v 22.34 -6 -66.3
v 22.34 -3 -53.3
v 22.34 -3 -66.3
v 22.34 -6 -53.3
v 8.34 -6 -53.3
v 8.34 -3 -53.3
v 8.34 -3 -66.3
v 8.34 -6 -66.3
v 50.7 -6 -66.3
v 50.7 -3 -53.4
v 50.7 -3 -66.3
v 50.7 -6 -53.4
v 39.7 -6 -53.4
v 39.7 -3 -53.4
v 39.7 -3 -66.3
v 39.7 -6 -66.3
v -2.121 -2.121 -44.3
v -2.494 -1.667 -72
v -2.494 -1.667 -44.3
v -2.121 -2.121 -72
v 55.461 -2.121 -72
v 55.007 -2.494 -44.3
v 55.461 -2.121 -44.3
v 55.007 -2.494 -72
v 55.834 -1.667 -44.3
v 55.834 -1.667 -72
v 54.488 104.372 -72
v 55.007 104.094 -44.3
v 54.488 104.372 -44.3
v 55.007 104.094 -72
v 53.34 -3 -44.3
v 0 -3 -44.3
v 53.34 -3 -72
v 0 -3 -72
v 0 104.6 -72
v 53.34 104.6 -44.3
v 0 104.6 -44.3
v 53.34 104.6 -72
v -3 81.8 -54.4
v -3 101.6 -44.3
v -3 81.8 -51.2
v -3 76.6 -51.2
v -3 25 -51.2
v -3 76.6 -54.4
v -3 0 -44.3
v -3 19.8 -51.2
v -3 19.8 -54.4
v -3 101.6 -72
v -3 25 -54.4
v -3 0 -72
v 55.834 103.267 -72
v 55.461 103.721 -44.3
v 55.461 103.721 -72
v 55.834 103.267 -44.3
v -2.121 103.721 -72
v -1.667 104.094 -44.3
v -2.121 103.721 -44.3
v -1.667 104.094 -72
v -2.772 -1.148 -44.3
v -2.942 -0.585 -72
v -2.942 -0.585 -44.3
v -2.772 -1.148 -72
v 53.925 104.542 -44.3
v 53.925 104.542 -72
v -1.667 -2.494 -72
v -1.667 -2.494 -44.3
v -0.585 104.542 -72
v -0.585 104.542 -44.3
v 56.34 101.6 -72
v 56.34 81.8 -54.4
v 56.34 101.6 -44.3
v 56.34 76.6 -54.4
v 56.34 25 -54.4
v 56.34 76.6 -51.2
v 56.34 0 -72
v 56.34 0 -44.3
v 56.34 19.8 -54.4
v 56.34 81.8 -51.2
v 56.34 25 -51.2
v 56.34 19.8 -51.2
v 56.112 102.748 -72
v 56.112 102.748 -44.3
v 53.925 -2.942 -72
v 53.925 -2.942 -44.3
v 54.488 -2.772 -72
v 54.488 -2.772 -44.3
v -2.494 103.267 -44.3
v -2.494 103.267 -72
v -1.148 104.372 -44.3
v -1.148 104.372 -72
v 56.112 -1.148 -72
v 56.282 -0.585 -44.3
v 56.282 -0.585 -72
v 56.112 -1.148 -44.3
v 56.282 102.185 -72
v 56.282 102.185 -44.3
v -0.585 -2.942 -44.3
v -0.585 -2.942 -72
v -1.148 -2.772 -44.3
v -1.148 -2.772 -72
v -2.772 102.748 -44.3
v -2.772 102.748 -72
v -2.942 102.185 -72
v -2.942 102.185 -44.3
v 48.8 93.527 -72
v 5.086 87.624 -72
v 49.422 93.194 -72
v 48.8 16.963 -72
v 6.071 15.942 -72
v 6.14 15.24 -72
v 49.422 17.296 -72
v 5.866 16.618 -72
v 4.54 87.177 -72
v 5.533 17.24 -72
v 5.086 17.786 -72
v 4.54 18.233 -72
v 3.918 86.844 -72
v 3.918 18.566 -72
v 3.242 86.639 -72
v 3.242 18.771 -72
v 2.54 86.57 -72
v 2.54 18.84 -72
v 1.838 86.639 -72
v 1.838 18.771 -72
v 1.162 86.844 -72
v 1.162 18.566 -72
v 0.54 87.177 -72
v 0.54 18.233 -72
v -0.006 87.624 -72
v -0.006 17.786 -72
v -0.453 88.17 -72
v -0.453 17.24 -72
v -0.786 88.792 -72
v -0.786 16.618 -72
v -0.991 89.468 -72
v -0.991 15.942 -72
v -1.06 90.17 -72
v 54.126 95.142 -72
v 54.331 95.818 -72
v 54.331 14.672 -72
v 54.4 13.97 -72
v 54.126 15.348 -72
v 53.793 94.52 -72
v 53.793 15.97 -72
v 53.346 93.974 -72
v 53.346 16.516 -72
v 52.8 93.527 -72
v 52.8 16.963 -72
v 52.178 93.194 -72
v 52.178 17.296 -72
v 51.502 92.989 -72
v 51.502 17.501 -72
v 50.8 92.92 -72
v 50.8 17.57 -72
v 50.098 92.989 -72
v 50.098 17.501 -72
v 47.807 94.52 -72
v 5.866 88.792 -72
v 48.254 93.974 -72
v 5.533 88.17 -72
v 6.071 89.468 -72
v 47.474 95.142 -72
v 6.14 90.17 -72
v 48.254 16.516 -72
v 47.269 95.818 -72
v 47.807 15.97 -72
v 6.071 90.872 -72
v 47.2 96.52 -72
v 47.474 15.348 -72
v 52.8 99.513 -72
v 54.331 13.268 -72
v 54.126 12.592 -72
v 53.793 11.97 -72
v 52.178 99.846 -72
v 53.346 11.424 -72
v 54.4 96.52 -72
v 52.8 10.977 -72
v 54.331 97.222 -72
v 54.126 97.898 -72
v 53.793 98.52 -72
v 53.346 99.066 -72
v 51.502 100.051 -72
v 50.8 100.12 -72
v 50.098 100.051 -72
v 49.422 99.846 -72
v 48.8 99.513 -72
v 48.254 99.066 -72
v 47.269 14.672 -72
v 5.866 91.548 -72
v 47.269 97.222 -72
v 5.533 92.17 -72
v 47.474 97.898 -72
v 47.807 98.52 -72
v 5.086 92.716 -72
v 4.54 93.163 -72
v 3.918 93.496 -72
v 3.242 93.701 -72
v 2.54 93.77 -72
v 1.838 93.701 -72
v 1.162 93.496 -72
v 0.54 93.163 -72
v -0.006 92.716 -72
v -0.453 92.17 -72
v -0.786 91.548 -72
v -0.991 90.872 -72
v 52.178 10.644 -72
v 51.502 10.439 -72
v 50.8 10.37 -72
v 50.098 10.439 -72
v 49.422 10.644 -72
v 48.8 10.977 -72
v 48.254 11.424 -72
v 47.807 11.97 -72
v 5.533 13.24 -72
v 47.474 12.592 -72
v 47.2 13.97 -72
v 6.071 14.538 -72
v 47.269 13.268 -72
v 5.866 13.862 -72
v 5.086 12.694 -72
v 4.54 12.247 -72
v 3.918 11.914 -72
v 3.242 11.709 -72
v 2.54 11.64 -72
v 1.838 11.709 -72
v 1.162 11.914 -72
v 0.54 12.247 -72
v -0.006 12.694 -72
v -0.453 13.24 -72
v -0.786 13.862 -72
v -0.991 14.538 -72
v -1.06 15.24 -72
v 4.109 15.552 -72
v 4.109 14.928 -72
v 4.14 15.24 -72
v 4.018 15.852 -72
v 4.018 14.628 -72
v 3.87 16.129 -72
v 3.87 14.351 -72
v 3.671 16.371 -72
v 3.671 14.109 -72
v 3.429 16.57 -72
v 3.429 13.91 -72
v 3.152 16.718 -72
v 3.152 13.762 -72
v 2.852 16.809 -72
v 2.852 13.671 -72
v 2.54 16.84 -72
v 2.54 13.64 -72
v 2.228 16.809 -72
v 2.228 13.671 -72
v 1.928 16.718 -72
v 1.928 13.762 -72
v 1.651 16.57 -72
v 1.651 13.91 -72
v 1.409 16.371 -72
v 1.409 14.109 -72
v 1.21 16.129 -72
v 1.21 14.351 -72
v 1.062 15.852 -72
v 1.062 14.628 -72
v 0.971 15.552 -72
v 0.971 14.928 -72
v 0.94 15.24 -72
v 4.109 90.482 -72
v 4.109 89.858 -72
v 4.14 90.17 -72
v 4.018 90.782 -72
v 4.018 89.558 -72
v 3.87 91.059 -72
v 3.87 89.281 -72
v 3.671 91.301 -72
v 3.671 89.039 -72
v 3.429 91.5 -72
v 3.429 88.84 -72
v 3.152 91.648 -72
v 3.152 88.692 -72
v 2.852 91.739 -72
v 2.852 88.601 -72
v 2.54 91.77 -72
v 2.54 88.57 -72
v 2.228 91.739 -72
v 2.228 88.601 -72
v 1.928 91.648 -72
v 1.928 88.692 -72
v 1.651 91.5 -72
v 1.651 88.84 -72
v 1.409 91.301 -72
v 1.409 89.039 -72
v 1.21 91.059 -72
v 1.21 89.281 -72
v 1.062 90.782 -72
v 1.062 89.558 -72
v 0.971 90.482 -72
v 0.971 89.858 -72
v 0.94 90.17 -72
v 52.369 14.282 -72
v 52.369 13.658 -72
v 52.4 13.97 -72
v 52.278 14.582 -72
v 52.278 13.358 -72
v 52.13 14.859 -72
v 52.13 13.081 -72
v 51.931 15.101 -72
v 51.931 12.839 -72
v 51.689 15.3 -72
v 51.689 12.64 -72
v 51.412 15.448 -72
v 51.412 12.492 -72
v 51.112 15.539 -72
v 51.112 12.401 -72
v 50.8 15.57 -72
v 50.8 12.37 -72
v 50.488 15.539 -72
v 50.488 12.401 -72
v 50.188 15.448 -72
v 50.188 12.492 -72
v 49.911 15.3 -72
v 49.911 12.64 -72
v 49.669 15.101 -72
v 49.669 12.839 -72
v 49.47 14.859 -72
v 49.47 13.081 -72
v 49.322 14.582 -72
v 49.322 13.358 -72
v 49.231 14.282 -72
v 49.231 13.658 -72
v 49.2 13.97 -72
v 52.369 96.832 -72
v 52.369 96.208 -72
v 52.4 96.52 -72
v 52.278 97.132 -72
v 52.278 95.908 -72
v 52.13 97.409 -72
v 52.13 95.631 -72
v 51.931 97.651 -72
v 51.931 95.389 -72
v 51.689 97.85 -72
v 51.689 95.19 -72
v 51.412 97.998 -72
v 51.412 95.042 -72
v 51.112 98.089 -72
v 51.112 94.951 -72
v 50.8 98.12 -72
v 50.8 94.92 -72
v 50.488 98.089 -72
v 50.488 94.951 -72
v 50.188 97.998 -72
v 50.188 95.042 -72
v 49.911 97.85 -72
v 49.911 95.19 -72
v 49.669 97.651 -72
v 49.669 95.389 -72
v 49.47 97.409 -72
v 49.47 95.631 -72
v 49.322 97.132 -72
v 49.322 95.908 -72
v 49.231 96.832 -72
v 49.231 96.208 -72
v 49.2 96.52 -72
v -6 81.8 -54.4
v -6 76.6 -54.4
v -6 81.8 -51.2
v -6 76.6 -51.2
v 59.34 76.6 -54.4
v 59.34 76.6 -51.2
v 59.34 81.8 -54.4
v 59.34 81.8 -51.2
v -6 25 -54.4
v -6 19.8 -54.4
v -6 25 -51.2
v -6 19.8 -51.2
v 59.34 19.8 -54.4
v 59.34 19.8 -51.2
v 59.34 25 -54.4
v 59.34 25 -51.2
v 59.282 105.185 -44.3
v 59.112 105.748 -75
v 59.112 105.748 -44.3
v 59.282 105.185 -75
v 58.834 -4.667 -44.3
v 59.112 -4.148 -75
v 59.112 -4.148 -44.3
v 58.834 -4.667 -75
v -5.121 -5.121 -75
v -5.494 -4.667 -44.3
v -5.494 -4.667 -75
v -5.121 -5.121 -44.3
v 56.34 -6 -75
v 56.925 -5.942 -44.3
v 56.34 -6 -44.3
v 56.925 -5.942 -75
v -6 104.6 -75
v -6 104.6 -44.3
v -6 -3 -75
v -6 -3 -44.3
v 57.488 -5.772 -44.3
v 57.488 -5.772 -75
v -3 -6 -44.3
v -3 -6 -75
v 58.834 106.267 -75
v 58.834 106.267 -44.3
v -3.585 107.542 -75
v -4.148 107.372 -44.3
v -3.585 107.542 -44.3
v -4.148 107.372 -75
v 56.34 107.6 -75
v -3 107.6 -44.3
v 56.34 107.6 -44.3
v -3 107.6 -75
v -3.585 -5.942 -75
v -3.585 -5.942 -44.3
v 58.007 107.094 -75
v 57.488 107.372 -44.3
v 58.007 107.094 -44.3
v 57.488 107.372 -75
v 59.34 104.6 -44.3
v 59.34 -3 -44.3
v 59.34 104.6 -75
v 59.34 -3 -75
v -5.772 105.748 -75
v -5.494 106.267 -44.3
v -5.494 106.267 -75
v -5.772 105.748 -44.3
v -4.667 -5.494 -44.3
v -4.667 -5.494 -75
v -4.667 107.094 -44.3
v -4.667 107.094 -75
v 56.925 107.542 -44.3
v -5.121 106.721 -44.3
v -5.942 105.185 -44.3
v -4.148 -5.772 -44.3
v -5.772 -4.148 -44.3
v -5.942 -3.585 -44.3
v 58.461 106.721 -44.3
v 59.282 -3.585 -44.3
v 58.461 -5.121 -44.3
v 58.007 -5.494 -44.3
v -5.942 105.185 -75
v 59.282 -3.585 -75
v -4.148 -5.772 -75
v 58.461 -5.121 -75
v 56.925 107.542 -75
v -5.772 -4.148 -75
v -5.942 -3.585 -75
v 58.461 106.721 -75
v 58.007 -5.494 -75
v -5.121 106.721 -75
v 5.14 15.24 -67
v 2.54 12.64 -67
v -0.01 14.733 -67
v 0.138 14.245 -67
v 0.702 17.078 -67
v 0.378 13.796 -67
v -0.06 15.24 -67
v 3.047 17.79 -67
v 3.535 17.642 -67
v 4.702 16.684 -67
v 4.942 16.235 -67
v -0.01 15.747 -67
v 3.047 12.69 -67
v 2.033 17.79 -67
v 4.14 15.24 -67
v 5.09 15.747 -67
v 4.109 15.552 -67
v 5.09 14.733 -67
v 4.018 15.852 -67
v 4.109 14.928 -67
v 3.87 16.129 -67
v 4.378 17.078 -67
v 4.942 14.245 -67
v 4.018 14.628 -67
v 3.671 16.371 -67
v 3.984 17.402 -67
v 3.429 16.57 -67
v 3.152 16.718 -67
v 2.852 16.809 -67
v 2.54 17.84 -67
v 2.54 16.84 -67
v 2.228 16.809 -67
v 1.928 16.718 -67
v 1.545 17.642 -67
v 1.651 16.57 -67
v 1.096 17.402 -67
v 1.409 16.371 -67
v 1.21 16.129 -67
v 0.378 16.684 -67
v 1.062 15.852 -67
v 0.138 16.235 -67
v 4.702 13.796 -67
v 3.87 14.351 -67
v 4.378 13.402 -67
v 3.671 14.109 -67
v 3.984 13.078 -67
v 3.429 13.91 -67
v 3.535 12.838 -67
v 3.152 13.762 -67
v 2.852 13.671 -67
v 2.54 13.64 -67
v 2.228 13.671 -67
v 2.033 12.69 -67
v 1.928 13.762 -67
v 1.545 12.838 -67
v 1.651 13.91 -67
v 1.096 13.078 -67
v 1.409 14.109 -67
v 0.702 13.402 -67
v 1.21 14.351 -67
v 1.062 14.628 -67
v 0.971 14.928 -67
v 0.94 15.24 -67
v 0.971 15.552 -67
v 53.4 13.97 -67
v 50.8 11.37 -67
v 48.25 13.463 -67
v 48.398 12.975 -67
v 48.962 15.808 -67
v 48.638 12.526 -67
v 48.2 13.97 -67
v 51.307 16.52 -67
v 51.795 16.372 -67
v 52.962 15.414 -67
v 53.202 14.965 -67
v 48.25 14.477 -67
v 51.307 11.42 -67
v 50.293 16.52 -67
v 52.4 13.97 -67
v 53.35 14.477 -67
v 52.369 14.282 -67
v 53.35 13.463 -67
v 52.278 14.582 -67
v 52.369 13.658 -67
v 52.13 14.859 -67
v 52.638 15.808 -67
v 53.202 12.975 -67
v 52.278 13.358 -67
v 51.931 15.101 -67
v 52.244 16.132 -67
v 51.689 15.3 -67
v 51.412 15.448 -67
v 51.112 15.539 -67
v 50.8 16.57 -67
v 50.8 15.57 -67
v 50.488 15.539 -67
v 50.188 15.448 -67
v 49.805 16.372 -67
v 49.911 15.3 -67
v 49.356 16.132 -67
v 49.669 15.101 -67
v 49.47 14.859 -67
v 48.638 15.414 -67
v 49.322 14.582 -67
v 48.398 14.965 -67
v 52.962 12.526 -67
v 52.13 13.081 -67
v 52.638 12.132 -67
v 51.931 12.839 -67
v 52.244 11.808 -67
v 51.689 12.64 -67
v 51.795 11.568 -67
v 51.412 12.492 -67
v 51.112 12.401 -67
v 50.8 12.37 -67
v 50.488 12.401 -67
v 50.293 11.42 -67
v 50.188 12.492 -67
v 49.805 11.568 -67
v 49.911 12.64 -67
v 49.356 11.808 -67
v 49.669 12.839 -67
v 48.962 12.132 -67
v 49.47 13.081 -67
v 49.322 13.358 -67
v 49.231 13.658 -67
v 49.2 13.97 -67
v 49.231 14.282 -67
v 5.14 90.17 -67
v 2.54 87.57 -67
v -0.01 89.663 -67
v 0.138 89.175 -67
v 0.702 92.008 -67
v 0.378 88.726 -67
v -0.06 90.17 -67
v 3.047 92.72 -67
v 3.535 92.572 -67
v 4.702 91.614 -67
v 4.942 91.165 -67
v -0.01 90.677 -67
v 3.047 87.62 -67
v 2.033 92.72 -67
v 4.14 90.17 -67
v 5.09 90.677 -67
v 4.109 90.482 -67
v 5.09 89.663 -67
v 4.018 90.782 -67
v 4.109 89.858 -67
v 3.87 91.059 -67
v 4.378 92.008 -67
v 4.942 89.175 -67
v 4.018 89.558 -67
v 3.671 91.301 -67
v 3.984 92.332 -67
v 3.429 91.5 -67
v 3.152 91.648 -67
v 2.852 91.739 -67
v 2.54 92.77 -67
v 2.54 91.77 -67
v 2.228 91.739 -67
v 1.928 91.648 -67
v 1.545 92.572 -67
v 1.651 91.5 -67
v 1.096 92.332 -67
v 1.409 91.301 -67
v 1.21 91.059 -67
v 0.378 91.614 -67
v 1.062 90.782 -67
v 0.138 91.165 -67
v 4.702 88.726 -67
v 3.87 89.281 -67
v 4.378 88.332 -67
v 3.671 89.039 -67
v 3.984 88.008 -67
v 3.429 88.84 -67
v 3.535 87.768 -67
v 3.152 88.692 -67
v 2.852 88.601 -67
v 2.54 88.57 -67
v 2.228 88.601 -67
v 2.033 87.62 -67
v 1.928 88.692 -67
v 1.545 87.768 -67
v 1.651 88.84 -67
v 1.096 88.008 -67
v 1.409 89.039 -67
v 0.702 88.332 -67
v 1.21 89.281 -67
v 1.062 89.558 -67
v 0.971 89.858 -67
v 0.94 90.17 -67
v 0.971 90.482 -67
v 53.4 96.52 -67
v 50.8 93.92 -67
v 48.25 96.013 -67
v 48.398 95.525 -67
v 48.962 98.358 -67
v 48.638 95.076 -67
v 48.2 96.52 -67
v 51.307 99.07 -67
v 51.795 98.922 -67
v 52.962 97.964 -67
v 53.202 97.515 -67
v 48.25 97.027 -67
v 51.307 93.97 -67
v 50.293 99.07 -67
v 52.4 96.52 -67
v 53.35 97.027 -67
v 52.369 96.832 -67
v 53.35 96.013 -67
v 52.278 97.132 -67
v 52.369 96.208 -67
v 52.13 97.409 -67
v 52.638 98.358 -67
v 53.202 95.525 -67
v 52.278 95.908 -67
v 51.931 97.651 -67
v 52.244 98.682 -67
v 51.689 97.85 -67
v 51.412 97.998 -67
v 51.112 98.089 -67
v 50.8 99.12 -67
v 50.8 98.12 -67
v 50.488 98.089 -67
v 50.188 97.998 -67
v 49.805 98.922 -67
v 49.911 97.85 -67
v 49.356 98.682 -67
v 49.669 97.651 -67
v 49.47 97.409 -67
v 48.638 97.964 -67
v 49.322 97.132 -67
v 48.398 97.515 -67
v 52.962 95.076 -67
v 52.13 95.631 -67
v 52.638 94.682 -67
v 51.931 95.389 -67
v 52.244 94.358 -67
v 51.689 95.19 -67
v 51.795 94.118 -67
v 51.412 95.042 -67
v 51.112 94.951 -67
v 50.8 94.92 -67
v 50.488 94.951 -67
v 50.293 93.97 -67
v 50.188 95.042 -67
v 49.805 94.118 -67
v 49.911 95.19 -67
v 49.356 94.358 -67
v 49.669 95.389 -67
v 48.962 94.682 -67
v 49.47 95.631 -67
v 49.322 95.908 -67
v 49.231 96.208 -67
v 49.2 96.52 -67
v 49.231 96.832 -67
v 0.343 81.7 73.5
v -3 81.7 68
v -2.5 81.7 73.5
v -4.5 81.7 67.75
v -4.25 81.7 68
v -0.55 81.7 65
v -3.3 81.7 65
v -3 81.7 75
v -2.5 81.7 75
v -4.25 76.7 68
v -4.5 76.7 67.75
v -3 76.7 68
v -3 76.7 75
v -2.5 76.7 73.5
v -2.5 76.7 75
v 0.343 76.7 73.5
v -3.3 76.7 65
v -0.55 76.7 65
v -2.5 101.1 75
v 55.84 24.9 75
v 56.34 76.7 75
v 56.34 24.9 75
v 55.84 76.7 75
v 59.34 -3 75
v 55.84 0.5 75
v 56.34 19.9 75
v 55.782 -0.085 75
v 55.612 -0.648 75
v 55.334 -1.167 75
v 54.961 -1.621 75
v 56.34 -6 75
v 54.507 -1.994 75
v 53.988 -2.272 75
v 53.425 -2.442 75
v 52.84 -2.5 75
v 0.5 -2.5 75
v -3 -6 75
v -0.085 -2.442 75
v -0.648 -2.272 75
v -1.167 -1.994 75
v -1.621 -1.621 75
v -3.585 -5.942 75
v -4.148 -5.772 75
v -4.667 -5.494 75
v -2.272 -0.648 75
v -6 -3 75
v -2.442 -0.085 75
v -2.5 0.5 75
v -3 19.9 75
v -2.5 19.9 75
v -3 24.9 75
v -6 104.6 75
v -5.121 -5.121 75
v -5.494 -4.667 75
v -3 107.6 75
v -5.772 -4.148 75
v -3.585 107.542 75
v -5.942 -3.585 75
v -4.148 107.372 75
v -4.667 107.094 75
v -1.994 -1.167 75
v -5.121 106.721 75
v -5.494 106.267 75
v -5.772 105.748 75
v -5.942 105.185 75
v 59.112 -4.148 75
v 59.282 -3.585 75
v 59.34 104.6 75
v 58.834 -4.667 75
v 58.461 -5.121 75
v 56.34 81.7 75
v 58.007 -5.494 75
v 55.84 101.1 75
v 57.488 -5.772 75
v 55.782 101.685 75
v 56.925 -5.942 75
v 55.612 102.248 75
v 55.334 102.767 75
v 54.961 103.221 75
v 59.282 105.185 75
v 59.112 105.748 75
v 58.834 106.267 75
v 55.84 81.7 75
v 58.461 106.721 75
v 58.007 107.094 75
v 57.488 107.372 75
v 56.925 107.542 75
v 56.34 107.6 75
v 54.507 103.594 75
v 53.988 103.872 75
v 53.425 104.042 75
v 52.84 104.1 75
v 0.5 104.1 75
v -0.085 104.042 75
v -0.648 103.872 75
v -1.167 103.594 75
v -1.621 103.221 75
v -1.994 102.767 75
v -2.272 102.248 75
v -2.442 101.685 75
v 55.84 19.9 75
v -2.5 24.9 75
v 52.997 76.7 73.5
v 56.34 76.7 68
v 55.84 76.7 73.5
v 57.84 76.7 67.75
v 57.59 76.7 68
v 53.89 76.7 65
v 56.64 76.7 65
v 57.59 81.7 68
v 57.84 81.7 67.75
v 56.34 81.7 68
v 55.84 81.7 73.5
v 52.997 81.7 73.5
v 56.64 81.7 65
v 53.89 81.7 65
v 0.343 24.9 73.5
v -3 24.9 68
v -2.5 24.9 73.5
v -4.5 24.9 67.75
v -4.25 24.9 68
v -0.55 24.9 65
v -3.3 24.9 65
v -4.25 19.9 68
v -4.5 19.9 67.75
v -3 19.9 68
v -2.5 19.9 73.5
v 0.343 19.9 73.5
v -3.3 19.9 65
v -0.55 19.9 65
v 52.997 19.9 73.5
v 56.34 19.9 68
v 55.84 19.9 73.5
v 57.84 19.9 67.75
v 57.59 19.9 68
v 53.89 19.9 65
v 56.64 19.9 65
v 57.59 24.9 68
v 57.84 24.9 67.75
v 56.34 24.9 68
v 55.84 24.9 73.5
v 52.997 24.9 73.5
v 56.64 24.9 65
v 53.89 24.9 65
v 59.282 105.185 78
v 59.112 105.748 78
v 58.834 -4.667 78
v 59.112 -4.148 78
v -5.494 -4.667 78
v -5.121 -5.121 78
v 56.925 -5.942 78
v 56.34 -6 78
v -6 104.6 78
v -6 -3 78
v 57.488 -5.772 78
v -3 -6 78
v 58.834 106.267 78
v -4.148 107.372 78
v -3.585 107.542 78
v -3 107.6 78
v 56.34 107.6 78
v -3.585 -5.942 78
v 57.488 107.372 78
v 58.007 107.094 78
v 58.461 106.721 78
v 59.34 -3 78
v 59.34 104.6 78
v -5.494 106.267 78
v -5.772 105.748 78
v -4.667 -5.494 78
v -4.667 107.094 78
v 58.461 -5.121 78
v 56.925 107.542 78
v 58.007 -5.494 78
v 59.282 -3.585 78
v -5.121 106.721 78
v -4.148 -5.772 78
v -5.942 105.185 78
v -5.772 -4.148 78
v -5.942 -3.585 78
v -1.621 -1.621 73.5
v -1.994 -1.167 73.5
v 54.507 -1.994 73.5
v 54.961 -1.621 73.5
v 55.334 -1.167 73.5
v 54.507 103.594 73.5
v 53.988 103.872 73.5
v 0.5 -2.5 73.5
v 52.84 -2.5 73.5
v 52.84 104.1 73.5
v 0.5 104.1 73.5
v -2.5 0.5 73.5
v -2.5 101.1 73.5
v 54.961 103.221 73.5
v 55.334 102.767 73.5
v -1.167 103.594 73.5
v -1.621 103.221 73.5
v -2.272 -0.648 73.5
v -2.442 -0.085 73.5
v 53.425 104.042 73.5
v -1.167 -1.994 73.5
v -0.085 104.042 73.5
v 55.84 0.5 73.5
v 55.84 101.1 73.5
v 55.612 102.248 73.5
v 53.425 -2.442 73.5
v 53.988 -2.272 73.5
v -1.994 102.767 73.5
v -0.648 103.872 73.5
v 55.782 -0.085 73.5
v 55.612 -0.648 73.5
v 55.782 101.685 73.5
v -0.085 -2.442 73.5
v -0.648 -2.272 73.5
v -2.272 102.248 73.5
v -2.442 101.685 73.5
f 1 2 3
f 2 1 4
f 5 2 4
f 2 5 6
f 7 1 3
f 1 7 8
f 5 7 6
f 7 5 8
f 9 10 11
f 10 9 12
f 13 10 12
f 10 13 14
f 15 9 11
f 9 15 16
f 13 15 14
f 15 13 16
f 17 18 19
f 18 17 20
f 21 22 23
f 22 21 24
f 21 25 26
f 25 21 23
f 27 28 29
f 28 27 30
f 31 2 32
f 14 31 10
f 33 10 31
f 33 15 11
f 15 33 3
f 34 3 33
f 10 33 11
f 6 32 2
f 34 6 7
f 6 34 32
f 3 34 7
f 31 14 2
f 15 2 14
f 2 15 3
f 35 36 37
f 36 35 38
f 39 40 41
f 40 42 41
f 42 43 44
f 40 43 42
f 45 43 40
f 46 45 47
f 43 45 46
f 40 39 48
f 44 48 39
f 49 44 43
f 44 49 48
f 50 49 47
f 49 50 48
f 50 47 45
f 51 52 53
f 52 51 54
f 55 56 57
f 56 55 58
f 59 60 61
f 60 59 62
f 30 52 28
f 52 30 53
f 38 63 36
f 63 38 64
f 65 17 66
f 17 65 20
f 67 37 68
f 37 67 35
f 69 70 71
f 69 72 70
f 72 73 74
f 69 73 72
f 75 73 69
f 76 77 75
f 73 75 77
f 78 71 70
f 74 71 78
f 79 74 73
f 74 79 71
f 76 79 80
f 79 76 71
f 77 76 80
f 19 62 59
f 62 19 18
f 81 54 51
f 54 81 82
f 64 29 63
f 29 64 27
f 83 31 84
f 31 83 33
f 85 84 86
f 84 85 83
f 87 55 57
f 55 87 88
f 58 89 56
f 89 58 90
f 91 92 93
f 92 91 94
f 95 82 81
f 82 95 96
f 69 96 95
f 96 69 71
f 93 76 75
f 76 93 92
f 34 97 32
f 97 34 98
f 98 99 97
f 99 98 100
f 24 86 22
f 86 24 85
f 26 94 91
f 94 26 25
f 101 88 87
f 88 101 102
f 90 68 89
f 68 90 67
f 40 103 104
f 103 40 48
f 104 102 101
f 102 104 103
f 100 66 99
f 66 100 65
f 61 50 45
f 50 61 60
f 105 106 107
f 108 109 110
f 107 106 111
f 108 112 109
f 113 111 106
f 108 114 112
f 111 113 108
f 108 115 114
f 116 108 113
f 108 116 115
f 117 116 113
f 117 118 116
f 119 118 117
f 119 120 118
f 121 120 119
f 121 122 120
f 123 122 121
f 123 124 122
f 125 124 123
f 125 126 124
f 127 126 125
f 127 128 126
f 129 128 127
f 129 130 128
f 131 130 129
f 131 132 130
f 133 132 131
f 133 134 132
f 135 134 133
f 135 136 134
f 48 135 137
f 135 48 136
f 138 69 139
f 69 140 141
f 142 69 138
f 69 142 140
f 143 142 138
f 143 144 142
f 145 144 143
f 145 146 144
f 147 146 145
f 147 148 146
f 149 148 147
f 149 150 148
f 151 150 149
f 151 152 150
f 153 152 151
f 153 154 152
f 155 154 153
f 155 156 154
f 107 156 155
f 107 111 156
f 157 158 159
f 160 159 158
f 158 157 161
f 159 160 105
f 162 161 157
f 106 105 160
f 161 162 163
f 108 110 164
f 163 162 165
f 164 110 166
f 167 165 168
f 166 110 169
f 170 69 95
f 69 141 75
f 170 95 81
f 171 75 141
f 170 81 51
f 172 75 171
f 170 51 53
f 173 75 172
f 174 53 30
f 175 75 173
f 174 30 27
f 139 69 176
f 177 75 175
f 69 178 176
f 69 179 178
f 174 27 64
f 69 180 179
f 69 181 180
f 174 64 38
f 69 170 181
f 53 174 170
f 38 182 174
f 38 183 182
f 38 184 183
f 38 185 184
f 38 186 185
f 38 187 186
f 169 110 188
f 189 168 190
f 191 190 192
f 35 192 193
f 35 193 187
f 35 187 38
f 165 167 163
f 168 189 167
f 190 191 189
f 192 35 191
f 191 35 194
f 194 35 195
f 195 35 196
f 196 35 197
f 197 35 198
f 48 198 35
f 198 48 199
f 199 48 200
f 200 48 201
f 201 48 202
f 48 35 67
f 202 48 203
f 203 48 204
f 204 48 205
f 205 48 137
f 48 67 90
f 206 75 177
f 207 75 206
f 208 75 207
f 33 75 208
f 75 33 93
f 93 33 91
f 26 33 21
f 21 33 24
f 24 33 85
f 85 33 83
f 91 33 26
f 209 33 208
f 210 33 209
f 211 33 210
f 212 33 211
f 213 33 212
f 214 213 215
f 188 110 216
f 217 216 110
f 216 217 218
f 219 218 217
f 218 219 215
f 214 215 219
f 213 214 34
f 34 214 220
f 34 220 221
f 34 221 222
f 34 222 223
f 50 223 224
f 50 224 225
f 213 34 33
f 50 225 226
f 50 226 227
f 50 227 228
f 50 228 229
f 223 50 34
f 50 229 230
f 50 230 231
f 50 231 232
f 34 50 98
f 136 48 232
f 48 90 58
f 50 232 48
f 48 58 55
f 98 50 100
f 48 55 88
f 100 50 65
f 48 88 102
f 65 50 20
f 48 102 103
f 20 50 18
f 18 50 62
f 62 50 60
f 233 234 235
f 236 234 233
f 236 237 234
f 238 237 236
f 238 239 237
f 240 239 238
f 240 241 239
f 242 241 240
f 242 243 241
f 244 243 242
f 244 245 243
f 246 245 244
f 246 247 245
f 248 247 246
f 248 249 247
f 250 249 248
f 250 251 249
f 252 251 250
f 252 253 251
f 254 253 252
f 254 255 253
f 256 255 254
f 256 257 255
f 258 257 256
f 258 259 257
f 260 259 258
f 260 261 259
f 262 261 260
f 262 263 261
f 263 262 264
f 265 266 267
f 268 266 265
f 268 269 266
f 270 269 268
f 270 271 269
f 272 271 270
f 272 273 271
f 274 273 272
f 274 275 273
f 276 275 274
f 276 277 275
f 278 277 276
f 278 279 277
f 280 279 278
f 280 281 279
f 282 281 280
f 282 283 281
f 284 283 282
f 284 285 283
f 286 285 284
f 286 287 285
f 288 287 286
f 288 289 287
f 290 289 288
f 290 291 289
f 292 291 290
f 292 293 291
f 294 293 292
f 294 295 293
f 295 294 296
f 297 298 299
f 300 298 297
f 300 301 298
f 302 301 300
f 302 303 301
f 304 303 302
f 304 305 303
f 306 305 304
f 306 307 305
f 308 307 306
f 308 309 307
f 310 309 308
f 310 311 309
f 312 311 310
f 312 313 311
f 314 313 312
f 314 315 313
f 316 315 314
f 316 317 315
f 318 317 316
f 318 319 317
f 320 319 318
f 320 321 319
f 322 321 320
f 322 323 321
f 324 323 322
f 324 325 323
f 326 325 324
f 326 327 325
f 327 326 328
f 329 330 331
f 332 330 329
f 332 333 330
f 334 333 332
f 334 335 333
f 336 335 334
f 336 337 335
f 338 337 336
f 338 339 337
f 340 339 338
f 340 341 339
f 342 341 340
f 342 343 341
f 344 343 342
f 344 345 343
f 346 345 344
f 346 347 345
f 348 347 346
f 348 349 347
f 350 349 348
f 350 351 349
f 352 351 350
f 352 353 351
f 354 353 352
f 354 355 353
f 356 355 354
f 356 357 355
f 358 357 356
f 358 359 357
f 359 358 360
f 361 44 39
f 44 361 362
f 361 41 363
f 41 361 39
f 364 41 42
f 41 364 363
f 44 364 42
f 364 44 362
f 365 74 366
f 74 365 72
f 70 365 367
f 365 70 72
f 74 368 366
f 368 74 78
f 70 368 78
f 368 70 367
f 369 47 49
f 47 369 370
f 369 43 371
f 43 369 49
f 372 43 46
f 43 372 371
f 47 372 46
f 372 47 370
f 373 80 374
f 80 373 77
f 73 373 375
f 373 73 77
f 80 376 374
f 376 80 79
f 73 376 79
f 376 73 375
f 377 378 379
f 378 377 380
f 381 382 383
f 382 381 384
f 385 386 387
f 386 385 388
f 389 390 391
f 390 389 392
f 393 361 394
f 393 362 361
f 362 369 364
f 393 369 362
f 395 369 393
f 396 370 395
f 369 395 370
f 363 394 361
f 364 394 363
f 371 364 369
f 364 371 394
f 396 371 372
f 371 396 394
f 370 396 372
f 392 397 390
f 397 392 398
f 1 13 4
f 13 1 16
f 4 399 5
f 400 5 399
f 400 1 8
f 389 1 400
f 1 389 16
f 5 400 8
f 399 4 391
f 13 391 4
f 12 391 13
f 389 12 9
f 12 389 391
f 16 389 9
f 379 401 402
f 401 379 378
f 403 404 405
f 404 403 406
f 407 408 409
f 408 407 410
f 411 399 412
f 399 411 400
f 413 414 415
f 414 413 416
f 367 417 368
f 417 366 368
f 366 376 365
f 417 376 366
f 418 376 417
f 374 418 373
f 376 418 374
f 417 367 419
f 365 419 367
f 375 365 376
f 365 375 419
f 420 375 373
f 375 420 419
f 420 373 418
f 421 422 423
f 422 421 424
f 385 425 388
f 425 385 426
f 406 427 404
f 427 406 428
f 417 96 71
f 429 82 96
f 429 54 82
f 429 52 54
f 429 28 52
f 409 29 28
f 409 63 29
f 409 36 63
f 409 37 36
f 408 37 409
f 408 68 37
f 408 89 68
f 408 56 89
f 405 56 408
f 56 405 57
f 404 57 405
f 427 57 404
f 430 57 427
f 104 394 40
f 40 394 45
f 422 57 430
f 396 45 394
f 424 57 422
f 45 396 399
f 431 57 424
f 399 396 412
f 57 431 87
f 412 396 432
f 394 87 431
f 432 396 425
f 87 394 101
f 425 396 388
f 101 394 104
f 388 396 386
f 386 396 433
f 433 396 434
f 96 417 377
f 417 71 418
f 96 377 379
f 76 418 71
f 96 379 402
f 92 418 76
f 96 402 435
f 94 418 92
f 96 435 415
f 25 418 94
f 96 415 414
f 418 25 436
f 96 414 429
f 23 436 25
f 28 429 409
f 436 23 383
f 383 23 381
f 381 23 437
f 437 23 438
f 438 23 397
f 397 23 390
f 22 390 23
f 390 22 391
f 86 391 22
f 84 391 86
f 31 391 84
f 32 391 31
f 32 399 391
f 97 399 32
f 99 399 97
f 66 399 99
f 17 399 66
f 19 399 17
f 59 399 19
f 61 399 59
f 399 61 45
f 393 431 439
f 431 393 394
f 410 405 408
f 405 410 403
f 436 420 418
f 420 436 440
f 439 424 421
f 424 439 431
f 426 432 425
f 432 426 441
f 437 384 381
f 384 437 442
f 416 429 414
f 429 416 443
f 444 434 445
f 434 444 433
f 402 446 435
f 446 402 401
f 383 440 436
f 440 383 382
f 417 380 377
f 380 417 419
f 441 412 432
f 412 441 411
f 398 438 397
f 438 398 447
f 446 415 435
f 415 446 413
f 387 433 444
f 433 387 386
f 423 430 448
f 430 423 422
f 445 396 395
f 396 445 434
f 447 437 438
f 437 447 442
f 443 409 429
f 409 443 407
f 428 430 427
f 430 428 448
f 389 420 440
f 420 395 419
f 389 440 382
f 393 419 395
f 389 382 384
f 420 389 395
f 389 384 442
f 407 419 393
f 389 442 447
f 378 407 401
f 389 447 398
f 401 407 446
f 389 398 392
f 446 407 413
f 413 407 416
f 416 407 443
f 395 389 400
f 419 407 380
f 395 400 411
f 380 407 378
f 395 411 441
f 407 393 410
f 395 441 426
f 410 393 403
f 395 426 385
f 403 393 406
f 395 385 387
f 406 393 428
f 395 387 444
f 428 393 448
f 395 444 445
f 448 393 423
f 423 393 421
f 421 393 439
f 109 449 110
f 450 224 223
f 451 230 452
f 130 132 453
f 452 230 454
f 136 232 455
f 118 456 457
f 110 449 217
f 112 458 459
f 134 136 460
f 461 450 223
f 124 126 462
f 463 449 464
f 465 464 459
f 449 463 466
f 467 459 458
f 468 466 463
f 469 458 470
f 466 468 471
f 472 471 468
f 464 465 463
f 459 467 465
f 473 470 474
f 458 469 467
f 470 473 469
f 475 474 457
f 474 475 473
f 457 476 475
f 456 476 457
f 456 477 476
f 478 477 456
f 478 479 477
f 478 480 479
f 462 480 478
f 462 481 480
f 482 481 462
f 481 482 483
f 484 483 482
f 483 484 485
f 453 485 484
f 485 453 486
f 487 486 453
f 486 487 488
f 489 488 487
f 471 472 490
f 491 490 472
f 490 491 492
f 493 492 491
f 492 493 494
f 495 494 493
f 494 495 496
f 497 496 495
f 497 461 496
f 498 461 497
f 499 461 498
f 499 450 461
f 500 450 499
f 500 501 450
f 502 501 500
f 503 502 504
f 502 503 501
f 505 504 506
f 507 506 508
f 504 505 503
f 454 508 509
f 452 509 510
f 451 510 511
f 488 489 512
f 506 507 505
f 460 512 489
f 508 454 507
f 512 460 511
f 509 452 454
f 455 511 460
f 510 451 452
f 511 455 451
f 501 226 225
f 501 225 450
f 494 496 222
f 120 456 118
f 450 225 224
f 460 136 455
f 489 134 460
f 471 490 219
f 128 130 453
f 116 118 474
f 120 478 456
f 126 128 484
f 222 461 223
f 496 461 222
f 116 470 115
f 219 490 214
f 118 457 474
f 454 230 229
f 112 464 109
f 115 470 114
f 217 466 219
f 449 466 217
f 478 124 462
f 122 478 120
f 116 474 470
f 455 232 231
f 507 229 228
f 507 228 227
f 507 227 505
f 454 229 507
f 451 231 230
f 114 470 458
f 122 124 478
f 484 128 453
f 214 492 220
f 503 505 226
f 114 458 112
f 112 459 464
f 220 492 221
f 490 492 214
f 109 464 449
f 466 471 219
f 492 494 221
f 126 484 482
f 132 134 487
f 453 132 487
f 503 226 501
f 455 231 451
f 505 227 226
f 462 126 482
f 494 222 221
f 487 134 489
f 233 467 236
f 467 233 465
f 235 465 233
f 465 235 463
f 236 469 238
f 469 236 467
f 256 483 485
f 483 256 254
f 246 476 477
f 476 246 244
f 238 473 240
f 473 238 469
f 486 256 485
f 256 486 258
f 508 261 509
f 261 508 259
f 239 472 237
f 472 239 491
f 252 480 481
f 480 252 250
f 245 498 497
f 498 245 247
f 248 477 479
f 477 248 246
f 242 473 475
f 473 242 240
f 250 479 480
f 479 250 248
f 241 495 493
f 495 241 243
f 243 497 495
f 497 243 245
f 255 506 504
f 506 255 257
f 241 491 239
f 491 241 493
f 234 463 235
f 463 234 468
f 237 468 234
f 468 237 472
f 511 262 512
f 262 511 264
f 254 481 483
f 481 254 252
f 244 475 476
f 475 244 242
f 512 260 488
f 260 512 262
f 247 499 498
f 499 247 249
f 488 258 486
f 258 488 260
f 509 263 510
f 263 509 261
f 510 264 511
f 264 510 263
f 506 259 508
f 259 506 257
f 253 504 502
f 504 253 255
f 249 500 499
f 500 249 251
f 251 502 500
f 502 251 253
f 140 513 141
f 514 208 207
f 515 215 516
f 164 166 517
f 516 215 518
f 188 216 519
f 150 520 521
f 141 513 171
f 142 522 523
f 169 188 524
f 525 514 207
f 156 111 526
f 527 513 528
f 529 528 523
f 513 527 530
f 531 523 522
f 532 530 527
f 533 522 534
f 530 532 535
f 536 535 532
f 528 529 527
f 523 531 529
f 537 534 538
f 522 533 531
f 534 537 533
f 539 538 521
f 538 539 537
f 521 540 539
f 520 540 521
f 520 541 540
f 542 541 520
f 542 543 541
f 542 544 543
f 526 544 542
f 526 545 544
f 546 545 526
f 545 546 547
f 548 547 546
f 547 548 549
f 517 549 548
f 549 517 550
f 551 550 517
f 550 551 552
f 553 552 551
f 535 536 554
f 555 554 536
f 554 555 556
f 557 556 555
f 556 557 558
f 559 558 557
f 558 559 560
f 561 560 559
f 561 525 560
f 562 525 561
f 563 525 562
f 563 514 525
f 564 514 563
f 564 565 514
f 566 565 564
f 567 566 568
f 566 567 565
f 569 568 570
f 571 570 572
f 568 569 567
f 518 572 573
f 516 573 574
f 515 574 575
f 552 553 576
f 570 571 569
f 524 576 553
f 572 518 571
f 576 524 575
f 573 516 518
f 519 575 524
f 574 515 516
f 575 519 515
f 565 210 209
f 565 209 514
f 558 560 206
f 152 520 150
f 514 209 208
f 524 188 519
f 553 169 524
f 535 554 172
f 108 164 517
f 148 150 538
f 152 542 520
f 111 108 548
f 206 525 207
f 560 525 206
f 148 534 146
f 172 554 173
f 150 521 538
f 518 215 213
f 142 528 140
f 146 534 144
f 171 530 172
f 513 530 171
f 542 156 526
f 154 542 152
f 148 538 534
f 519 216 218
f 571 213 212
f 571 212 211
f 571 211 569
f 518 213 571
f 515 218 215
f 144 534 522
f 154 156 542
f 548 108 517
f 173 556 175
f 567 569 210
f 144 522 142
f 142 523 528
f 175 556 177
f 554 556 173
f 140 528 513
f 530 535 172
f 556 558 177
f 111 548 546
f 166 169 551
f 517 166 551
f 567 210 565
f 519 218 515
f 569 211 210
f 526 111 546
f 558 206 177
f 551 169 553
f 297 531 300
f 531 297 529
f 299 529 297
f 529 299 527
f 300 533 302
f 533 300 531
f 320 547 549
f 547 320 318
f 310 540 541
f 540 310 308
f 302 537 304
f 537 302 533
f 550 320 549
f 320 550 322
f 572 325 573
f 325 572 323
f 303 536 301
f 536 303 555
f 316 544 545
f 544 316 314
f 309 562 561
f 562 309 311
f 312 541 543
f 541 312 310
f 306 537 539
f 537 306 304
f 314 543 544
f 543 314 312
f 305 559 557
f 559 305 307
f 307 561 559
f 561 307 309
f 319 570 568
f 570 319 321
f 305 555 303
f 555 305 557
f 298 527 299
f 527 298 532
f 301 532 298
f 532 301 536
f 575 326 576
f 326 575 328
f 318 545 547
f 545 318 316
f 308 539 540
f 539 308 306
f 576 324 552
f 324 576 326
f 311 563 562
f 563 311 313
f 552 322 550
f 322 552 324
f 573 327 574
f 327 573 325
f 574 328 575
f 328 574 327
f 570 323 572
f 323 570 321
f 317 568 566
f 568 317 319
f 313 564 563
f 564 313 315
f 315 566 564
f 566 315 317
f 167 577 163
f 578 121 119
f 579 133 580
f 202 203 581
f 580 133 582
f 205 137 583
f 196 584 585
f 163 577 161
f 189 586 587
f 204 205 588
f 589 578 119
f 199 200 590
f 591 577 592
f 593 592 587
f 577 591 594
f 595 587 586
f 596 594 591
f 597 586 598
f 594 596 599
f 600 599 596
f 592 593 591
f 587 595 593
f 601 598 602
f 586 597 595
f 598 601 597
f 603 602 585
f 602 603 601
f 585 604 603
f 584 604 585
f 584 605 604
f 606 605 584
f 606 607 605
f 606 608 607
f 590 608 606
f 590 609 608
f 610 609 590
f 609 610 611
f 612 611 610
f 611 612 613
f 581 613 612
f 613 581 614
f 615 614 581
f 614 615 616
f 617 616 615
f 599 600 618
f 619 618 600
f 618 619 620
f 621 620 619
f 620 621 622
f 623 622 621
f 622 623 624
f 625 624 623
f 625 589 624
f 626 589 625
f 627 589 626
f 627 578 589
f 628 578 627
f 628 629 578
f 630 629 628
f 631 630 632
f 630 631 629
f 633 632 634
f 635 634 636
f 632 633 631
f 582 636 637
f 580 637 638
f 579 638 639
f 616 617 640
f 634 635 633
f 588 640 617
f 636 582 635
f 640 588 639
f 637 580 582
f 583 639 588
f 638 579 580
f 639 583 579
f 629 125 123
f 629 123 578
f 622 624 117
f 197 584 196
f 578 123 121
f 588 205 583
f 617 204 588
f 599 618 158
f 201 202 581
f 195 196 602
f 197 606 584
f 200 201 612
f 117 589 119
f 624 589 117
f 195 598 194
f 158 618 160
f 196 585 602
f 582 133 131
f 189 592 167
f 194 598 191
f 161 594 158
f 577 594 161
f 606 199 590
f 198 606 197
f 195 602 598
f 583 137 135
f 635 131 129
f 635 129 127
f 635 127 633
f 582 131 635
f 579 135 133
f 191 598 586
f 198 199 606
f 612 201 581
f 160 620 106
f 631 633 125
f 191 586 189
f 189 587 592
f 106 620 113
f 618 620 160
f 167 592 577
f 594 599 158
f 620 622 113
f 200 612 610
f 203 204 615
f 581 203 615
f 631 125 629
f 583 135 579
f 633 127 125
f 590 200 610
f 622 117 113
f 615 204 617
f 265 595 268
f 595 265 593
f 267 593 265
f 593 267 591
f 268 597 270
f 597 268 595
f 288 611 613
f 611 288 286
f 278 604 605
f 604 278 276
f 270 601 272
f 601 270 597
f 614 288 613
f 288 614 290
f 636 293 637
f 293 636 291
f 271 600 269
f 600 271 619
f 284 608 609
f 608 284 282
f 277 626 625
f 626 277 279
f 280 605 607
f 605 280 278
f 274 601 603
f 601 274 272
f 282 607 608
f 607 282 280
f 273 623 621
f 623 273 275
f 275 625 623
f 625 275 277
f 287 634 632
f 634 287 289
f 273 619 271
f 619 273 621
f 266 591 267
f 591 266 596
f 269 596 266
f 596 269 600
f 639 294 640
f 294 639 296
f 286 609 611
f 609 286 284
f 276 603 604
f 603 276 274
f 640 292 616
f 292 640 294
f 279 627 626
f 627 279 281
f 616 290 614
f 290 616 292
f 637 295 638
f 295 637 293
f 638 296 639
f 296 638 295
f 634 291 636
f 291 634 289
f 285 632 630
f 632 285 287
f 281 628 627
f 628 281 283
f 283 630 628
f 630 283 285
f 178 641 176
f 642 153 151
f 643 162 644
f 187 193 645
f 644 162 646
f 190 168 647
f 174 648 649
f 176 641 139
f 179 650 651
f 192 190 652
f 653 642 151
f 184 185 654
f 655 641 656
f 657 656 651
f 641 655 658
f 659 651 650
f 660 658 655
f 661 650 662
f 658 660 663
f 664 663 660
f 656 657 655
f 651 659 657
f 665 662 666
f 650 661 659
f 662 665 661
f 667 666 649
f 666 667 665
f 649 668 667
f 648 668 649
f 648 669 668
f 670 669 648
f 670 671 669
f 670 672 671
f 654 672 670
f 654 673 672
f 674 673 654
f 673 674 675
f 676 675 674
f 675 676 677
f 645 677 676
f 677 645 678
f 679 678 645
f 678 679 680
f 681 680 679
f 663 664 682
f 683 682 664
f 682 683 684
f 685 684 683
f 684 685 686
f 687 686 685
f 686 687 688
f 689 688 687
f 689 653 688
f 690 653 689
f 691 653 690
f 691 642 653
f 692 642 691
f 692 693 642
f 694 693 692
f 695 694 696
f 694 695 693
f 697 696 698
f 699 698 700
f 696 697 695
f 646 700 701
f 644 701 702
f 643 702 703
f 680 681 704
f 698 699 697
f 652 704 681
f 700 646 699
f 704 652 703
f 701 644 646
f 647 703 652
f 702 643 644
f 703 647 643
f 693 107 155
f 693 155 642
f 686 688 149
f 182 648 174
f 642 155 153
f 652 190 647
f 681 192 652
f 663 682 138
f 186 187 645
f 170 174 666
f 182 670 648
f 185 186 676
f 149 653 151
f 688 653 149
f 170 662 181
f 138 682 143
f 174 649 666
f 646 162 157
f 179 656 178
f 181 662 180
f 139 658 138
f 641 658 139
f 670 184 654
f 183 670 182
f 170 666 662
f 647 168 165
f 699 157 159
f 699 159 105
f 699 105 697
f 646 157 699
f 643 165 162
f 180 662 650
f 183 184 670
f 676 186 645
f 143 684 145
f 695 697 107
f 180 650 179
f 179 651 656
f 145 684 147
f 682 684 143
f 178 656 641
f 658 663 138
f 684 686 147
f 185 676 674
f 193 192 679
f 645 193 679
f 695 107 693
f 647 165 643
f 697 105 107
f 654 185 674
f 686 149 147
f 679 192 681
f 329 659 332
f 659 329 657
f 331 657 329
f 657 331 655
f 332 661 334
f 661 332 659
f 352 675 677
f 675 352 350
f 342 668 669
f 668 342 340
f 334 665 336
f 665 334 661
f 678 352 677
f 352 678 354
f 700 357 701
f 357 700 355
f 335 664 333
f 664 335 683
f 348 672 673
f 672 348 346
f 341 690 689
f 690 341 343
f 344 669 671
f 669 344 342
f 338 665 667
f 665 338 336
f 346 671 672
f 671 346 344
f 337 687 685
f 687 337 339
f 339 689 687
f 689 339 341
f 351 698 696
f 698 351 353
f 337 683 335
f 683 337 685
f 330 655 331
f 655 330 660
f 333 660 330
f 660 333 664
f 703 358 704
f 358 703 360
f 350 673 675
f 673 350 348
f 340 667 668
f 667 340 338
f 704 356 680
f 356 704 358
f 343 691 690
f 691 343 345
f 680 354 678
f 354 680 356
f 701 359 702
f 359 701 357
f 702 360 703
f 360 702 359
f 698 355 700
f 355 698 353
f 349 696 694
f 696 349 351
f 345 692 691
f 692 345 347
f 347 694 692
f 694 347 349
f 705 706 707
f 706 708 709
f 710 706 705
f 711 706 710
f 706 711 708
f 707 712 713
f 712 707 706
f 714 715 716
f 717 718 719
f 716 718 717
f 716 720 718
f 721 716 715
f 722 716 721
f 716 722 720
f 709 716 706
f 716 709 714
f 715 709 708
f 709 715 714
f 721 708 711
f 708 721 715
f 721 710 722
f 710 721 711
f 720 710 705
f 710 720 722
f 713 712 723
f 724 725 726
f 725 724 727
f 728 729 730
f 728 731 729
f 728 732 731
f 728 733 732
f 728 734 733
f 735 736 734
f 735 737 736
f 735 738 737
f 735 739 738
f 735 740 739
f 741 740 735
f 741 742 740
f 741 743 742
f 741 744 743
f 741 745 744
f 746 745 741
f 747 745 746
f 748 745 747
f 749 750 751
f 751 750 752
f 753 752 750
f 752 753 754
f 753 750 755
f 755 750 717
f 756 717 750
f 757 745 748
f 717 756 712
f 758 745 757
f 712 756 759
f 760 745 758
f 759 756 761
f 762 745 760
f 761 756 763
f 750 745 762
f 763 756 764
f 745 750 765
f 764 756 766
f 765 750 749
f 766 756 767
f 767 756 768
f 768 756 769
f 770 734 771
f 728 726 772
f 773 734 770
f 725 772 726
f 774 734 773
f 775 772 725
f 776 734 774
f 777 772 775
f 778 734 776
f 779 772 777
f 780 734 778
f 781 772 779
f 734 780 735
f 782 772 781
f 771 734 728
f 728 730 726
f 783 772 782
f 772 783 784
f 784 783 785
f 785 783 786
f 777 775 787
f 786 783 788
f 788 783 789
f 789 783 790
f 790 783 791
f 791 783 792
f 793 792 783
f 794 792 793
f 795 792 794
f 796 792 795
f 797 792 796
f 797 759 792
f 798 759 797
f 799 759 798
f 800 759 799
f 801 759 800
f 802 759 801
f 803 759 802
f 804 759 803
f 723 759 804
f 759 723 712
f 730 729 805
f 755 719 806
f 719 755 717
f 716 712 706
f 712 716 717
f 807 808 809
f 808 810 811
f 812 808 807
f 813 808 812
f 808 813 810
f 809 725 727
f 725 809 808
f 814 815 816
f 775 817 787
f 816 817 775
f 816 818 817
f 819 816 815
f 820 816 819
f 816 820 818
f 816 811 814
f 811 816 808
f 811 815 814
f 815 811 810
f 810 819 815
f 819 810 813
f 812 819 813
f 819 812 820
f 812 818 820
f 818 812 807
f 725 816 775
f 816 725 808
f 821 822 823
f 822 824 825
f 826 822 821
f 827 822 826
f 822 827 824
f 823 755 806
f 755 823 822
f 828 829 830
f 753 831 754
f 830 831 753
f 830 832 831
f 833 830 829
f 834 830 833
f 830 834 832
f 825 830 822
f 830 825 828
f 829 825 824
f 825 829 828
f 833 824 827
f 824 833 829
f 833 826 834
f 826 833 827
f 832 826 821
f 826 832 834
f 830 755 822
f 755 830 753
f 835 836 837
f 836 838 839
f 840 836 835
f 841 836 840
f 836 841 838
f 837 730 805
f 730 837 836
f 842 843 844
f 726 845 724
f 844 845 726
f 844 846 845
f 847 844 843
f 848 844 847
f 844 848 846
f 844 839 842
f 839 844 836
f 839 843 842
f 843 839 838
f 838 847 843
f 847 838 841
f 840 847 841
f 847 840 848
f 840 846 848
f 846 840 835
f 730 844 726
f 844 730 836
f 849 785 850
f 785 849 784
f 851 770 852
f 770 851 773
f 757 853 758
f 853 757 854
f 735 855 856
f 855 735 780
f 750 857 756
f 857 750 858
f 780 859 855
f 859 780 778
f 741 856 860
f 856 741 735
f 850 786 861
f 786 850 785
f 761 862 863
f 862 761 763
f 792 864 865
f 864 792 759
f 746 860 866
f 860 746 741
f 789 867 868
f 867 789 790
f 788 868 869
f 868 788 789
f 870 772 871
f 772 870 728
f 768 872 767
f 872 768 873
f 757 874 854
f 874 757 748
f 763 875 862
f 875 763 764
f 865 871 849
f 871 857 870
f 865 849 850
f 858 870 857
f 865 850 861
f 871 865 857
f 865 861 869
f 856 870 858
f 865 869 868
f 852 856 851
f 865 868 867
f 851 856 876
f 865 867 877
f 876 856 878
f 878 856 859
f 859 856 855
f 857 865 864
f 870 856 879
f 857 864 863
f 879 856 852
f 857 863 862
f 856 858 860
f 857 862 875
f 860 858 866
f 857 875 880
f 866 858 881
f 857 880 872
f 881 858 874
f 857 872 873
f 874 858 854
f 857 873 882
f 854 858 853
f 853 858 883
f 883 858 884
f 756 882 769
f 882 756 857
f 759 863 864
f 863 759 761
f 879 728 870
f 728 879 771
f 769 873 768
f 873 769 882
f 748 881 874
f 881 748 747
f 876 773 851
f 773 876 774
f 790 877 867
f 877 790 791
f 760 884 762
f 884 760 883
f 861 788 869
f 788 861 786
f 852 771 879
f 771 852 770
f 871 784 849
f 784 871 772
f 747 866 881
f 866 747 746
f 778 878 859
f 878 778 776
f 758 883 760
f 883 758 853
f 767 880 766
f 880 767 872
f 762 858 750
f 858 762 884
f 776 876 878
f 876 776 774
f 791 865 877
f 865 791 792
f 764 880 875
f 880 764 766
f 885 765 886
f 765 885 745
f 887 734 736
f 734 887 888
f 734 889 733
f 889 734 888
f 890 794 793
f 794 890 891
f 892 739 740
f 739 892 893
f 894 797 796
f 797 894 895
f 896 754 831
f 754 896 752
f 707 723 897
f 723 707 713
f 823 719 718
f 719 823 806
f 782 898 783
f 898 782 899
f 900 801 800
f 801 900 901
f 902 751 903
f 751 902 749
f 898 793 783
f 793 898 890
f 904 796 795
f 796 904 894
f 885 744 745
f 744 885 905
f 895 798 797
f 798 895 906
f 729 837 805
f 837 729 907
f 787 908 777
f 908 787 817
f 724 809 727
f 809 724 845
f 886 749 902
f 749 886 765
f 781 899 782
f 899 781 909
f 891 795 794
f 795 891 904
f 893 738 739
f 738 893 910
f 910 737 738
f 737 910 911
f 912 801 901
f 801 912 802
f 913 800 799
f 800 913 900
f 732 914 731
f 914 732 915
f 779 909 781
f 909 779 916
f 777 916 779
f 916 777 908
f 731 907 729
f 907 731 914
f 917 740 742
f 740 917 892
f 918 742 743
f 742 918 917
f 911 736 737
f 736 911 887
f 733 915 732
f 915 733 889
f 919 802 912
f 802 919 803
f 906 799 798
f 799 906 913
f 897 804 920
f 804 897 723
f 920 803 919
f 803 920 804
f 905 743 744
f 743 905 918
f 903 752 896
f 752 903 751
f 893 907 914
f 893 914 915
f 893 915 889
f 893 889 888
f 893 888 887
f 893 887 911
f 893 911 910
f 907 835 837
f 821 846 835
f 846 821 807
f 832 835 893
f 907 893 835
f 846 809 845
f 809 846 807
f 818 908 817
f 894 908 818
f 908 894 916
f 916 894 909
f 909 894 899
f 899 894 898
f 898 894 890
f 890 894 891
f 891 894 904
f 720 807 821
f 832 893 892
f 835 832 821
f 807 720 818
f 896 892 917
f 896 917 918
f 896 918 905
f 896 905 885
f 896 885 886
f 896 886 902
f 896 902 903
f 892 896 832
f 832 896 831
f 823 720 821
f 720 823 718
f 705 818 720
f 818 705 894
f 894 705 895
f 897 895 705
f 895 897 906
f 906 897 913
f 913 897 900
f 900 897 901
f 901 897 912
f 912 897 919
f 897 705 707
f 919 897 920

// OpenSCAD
// file: pins.scad
// Pin Connectors V3
// Tony Buser <tbuser@gmail.com>
// Modified by Emmett Lalish

object=0;//[0:pin,1:pinpeg,2:pinhole]
length=20;
diameter=8;
//Only affects pinhole
hole_twist=0;//[0:free,1:fixed]
//Only affects pinhole
hole_friction=0;//[0:loose,1:tight]
//Radial gap to help pins fit into tight holes
pin_tolerance=0.2;
//Extra gap to make loose hole
loose=0.3;
lip_height=3;
lip_thickness=1;
hf=hole_friction==0 ? false : true;
ht=hole_twist==0 ? false : true;

if(object==0)pin(h=length,r=diameter/2,lh=lip_height,lt=lip_thickness,t=pin_tolerance);
if(object==1)pinpeg(h=length,r=diameter/2,lh=lip_height,lt=lip_thickness,t=pin_tolerance);
if(object==2)pinhole(h=length,r=diameter/2,lh=lip_height,lt=lip_thickness,t=loose,
	tight=hf,fixed=ht);

module test() {
  tolerance = 0.3;
  
  translate([-12, 12, 0]) pinpeg(h=20);
  translate([12, 12, 0]) pintack(h=10);
  
  difference() {
    union() {
      translate([0, -12, 2.5]) cube(size = [59, 20, 5], center = true);
      translate([24, -12, 7.5]) cube(size = [12, 20, 15], center = true);
    }
    translate([-24, -12, 0]) pinhole(h=5, t=tolerance);
    translate([-12, -12, 0]) pinhole(h=5, t=tolerance, tight=false);
    translate([0, -12, 0]) pinhole(h=10, t=tolerance);
    translate([12, -12, 0]) pinhole(h=10, t=tolerance, tight=false);
    translate([24, -12, 15]) rotate([0, 180, 0]) pinhole(h=10, t=tolerance);
  }
}

module pinhole(h=10, r=4, lh=3, lt=1, t=0.3, tight=true, fixed=false) {
  // h = shaft height
  // r = shaft radius
  // lh = lip height
  // lt = lip thickness
  // t = extra tolerance for loose fit
  // tight = set to false if you want a joint that spins easily
  // fixed = set to true so pins can't spin
  
intersection(){
  union() {
	if (tight == true || fixed == true) {
      pin_solid(h, r, lh, lt);
	  translate([0,0,-t/2])cylinder(h=h+t, r=r, $fn=30);
	} else {
	  pin_solid(h, r+t/2, lh, lt);
	  translate([0,0,-t/2])cylinder(h=h+t, r=r+t/2, $fn=30);
	}
    
    
    // widen the entrance hole to make insertion easier
    //translate([0, 0, -0.1]) cylinder(h=lh/3, r2=r, r1=r+(t/2)+(lt/2),$fn=30);
  }
  if (fixed == true) {
	translate([-r*2, -r*0.75, -1])cube([r*4, r*1.5, h+2]);
  }
}}

module pin(h=10, r=4, lh=3, lt=1, t=0.2, side=false) {
  // h = shaft height
  // r = shaft radius
  // lh = lip height
  // lt = lip thickness
  // side = set to true if you want it printed horizontally

  if (side) {
    pin_horizontal(h, r, lh, lt, t);
  } else {
    //pin_vertical(h, r, lh, lt, t);
  }
}

module pintack(h=10, r=4, lh=3, lt=1, t=0.2, bh=3, br=8.75) {
  // bh = base_height
  // br = base_radius
  
  union() {
    cylinder(h=bh, r=br);
    translate([0, 0, bh]) pin(h, r, lh, lt, t);
  }
}

module pinpeg(h=20, r=4, lh=3, lt=1, t=0.2) {
  union() {
    translate([0,-0.05, 0]) pin(h/2+0.1, r, lh, lt, t, side=true);
    translate([0,0.05, 0]) rotate([0, 0, 180]) pin(h/2+0.1, r, lh, lt, t, side=true);
  }
}

// just call pin instead, I made this module because it was easier to do the rotation option this way
// since openscad complains of recursion if I did it all in one module
module pin_vertical(h=10, r=4, lh=3, lt=1, t=0.2) {
  // h = shaft height
  // r = shaft radius
  // lh = lip height
  // lt = lip thickness

  difference() {
    pin_solid(h, r-t/2, lh, lt);
    
    // center cut
    translate([-lt*3/2, -(r*2+lt*2)/2, h/5+lt*3/2]) cube([lt*3, r*2+lt*2, h]);
    //translate([0, 0, h/4]) cylinder(h=h+lh, r=r/2.5, $fn=20);
    // center curve
    translate([0, 0, h/5+lt*3/2]) rotate([90, 0, 0]) cylinder(h=r*2, r=lt*3/2, center=true, $fn=20);
  
    // side cuts
    translate([-r*2, -r-r*0.75+t/2, -1]) cube([r*4, r, h+2]);
    translate([-r*2, r*0.75-t/2, -1]) cube([r*4, r, h+2]);
  }
}

// call pin with side=true instead of this
module pin_horizontal(h=10, r=4, lh=3, lt=1, t=0.2) {
  // h = shaft height
  // r = shaft radius
  // lh = lip height
  // lt = lip thickness
  translate([0, 0, r*0.75-t/2]) rotate([-90, 0, 0]) pin_vertical(h, r, lh, lt, t);
}

// this is mainly to make the pinhole module easier
module pin_solid(h=10, r=4, lh=3, lt=1) {
  union() {
    // shaft
    cylinder(h=h-lh, r=r, $fn=30);
    // lip
    // translate([0, 0, h-lh]) cylinder(h=lh*0.25, r1=r, r2=r+(lt/2), $fn=30);
    // translate([0, 0, h-lh+lh*0.25]) cylinder(h=lh*0.25, r2=r, r1=r+(lt/2), $fn=30);
    // translate([0, 0, h-lh+lh*0.50]) cylinder(h=lh*0.50, r1=r, r2=r-(lt/2), $fn=30);

    // translate([0, 0, h-lh]) cylinder(h=lh*0.50, r1=r, r2=r+(lt/2), $fn=30);
    // translate([0, 0, h-lh+lh*0.50]) cylinder(h=lh*0.50, r1=r+(lt/2), r2=r-(lt/3), $fn=30);    

    translate([0, 0, h-lh]) cylinder(h=lh*0.25, r1=r, r2=r+(lt/2), $fn=30);
    translate([0, 0, h-lh+lh*0.25]) cylinder(h=lh*0.25, r=r+(lt/2), $fn=30);    
    translate([0, 0, h-lh+lh*0.50]) cylinder(h=lh*0.50, r1=r+(lt/2), r2=r-(lt/2), $fn=30);    

    // translate([0, 0, h-lh]) cylinder(h=lh, r1=r+(lt/2), r2=1, $fn=30);
    // translate([0, 0, h-lh-lt/2]) cylinder(h=lt/2, r1=r, r2=r+(lt/2), $fn=30);
  }
}

module pinshaft(h=10, r=4, t=0.2, side=false){
flip=side ? 1 : 0;
translate(flip*[0,h/2,r*0.75-t/2])rotate(flip*[90,0,0])
intersection(){
	cylinder(h=h, r=r-t/2, $fn=30);
	translate([-r*2, -r*0.75+t/2, -1])cube([r*4, r*1.5-t, h+2]);
}
}
// main file
include <arduino.scad>

// Enclosure for the Artemis Says project

// model of the board
//arduino(MEGA);

// lid
translate([0, 0, -75]) {
	enclosure(MEGA);
}

// case
translate([0, 0, 75]) {
	enclosureLid(MEGA);
}
